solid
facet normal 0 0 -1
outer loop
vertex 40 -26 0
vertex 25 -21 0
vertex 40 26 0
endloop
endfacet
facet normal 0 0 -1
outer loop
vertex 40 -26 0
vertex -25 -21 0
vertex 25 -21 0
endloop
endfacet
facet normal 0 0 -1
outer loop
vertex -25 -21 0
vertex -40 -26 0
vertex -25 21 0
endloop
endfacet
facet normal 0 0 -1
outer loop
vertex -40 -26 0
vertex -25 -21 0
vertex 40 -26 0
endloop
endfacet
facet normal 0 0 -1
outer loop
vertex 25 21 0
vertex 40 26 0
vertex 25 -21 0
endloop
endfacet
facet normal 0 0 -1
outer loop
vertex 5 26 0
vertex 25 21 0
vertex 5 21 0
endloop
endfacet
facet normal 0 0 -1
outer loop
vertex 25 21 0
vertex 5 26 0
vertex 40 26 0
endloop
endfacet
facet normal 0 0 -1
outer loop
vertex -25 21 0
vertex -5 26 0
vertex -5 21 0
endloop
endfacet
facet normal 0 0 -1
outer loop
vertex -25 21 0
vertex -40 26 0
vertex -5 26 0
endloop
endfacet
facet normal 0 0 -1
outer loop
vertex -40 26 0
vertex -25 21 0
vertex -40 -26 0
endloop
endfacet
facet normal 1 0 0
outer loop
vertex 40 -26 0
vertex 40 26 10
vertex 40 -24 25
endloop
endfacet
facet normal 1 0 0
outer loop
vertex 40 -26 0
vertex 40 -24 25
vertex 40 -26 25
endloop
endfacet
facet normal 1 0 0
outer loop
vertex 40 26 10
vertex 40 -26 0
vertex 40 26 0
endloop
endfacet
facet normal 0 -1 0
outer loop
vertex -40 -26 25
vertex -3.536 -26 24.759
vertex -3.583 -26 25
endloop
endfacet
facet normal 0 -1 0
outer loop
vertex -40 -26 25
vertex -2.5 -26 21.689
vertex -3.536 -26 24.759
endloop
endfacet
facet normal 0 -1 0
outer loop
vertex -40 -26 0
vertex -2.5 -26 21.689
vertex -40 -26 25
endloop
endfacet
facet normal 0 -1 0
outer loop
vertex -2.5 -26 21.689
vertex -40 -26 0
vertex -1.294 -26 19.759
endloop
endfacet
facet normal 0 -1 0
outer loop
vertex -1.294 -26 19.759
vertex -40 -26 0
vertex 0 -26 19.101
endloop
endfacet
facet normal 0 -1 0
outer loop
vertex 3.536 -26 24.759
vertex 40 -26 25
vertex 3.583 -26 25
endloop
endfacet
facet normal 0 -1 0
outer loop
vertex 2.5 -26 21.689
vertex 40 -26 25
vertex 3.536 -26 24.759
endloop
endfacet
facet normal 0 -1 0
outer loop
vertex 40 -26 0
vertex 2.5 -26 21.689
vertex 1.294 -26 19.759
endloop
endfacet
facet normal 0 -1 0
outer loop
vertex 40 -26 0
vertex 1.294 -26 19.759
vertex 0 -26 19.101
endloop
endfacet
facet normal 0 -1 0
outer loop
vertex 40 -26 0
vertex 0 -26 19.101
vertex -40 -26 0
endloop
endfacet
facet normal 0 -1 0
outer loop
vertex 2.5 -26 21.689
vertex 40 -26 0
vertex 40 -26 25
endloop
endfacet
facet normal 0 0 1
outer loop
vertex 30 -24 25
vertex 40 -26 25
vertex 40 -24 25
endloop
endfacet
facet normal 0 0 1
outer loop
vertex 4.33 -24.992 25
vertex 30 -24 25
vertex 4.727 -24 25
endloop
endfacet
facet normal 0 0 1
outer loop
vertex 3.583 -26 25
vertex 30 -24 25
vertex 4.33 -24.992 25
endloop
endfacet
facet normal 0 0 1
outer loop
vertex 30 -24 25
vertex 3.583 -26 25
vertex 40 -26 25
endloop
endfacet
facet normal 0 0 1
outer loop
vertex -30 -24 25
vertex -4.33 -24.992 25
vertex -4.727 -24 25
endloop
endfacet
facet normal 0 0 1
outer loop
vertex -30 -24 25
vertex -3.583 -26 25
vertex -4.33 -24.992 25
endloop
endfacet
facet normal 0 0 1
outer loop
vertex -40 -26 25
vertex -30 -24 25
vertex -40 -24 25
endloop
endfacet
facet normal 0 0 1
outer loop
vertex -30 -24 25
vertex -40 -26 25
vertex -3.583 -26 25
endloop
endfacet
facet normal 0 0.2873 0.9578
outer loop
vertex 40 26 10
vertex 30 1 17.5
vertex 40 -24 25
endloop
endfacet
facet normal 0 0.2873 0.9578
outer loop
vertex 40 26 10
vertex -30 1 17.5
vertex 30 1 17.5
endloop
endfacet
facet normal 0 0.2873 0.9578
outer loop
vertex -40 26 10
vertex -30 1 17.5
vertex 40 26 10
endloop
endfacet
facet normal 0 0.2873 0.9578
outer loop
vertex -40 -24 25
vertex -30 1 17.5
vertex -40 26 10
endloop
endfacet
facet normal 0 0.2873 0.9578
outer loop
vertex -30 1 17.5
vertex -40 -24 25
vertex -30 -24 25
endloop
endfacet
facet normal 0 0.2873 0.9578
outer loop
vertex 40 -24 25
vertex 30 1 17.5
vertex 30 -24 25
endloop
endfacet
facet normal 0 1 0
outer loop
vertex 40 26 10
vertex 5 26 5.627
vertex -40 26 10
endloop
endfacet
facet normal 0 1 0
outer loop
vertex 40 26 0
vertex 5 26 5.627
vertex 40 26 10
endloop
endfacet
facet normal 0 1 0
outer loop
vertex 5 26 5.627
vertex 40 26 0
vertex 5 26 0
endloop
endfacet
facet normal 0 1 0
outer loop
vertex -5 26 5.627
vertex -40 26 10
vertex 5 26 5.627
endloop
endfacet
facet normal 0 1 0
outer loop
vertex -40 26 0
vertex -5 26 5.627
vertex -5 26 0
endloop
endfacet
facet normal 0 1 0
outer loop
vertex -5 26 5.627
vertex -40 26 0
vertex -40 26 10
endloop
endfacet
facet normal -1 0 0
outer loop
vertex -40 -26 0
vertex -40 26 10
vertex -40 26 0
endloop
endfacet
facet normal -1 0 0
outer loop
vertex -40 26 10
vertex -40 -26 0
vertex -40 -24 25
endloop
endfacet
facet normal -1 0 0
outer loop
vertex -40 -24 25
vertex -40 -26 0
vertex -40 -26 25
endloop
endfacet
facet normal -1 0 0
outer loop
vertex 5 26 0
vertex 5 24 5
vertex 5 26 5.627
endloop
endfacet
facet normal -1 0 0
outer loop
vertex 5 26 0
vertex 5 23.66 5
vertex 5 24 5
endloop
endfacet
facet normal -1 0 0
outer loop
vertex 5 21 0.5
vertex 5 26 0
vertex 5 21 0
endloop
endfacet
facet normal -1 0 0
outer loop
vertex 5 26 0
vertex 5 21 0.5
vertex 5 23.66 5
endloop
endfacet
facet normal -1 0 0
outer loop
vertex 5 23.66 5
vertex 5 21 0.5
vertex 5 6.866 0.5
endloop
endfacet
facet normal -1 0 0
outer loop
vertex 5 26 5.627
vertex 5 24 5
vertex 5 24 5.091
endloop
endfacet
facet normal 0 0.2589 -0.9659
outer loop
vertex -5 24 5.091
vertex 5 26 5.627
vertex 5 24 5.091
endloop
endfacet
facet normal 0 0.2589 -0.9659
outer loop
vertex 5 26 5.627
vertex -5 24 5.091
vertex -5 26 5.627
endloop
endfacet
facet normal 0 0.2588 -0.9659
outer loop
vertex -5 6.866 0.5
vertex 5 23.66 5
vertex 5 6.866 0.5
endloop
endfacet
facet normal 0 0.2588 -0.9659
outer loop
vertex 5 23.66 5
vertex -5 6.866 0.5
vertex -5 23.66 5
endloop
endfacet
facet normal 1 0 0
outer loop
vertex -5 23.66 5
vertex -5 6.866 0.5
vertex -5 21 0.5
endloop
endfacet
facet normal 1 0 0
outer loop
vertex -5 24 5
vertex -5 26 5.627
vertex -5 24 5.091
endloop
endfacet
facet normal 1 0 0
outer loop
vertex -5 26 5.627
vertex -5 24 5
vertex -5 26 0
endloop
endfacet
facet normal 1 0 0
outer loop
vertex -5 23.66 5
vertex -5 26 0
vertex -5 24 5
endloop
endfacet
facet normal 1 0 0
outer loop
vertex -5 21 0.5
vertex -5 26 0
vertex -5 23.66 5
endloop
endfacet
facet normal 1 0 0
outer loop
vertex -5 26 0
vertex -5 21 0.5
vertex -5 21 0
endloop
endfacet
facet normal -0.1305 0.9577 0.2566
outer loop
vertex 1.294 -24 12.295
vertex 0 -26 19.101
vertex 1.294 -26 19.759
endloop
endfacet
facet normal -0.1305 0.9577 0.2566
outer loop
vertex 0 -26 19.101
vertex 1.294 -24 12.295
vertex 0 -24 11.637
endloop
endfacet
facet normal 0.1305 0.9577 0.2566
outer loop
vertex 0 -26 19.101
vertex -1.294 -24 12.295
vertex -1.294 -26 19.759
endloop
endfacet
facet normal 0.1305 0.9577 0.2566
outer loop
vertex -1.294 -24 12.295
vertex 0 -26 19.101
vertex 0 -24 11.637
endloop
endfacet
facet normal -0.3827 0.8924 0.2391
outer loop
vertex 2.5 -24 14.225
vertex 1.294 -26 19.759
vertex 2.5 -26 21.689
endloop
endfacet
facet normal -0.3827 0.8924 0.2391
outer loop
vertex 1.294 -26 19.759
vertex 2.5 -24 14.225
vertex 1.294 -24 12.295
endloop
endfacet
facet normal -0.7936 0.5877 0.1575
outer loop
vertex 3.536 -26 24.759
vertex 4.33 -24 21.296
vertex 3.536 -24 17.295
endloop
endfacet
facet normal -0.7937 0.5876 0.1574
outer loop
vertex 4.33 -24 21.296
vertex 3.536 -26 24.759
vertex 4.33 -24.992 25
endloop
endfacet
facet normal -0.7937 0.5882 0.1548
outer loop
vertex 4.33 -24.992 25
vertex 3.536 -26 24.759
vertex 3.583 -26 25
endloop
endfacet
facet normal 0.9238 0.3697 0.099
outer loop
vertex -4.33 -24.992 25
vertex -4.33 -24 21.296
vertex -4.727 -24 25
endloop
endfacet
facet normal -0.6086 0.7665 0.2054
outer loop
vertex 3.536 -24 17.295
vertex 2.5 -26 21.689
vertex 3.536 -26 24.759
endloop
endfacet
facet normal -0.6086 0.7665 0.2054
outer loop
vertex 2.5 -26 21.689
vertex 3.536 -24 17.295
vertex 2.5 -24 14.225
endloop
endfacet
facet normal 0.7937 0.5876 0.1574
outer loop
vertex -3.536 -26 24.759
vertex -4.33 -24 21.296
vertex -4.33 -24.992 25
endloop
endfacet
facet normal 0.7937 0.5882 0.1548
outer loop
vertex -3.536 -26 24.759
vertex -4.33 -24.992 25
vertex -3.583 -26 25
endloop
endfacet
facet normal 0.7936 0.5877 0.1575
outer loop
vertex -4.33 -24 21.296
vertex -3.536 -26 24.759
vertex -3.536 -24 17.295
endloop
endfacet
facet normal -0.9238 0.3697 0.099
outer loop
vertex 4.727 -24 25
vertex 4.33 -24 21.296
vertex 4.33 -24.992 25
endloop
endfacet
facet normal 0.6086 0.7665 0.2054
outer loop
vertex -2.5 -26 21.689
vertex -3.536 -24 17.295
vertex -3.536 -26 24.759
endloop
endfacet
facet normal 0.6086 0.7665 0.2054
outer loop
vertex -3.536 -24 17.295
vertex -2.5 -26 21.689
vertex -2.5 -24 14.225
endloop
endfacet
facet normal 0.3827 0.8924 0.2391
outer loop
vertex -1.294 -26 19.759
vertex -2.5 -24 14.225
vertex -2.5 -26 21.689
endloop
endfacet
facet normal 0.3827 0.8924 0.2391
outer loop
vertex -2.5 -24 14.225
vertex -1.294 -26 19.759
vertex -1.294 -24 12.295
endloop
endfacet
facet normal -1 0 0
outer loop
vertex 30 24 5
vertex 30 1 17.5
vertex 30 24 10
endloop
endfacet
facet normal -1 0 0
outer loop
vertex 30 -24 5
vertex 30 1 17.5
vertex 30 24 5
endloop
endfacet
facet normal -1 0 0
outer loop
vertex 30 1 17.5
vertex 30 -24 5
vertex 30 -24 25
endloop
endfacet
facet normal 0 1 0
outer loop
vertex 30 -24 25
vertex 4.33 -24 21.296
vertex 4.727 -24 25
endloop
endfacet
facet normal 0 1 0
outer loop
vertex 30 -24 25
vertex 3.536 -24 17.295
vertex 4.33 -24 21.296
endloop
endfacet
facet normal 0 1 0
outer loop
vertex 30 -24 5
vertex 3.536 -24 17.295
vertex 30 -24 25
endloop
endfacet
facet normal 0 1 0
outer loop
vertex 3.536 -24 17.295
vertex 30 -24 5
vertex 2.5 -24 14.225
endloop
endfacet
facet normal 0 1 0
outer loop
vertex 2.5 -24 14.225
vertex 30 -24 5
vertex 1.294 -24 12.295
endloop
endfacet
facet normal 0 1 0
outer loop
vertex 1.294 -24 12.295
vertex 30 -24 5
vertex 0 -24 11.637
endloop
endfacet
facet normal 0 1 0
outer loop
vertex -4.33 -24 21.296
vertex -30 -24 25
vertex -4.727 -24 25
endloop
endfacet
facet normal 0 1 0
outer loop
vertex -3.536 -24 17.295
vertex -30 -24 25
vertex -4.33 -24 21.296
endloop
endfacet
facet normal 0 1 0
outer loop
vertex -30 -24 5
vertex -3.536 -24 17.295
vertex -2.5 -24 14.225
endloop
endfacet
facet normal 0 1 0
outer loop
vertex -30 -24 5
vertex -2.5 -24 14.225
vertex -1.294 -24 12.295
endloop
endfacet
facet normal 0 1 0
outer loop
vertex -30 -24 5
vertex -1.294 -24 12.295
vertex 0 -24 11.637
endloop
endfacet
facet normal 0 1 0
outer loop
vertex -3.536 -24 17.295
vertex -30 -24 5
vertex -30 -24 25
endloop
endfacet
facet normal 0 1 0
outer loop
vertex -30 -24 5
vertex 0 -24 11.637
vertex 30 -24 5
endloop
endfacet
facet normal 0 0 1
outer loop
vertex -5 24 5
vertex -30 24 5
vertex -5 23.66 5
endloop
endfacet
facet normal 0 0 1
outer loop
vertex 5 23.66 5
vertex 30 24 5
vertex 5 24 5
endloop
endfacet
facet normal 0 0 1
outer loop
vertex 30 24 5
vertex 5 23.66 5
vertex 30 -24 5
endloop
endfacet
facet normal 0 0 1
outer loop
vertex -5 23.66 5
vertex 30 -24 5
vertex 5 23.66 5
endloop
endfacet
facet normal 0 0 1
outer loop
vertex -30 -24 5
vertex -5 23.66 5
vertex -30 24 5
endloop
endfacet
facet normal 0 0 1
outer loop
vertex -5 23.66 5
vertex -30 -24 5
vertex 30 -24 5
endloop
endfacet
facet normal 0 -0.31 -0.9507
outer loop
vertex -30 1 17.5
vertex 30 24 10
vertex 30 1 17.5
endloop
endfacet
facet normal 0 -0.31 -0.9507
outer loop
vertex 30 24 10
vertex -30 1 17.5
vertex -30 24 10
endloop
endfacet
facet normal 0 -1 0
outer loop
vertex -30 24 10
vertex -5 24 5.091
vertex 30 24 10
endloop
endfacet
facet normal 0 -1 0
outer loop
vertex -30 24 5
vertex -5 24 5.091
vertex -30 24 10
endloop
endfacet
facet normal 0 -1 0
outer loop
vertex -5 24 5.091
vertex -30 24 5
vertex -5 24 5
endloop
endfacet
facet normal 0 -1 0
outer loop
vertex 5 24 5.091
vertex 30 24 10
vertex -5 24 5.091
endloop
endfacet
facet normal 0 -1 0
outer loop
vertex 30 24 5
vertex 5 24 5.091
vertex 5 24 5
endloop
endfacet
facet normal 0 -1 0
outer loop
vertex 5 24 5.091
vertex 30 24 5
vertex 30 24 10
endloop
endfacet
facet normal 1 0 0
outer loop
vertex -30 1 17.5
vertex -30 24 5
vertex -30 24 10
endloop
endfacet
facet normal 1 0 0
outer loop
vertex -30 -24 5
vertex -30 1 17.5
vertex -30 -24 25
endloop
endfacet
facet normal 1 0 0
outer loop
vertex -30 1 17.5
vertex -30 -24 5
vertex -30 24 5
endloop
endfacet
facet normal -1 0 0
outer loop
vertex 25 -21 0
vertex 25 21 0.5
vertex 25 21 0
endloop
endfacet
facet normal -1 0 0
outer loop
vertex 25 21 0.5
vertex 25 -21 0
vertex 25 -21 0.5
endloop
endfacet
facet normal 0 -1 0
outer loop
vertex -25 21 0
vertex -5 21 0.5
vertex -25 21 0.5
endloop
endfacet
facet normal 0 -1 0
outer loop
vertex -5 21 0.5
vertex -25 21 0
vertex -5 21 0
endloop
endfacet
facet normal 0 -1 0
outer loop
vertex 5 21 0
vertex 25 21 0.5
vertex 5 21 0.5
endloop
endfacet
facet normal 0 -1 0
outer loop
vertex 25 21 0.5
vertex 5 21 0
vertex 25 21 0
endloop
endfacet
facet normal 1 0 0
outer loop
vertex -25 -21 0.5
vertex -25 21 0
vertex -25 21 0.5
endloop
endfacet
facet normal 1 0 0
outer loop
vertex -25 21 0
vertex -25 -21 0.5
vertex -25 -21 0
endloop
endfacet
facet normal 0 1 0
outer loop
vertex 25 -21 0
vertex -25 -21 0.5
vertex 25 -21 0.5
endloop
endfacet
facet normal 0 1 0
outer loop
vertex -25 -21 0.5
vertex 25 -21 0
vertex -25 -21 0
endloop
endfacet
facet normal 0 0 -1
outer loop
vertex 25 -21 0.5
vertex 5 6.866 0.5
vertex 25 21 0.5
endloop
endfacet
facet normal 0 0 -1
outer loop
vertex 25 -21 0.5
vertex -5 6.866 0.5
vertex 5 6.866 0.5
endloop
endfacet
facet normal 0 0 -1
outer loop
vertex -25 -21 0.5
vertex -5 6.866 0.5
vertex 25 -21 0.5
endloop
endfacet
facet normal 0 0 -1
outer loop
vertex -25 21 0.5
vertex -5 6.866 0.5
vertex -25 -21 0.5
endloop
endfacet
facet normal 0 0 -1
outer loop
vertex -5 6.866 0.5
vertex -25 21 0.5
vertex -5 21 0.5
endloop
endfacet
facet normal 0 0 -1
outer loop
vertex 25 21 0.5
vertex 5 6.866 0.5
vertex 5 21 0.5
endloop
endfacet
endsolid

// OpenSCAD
// ==========================================
// Xentient Framework - Anchor: Desk Pedestal Adapter
// Weighted wedge stand, 15° upward tilt, cable routing
// Per Framework §5
// ==========================================
// Component: Male cylinder (40mm dia) with cross-keys
//            Wedge-shaped base, 15° upward angle
//            Hollow routing channel for USB-C cable
// Material: PETG (structural) + weighted fill (sand/metal in base)
// Units: mm

$fn = 64;

// ==========================================
// ANCHOR DIMENSIONS (matching hub rear)
// ==========================================

Anchor_Dia   = 40.0;    // Male cylinder diameter
Anchor_Depth = 6.0;     // Insertion depth
Anchor_Key_W = 10.0;    // Anti-rotation key width

// Desk pedestal dimensions
Tilt_Angle   = 15;      // 15° upward angle for optimal viewing
Base_W       = 80.0;    // Base width (stable footprint)
Base_D       = 70.0;    // Base depth (front to back)
Base_H       = 25.0;    // Base height at rear (highest point)
Base_Min_H   = 10.0;    // Base height at front (lowest point)
Wall_T       = 2.5;     // Wall thickness

// Cable routing
Cable_D      = 8.0;     // USB-C cable diameter for routing channel

// Weight fill pocket (for sand/metal insert)
Weight_W     = 60.0;
Weight_D     = 50.0;
Weight_H     = 10.0;

// ==========================================
// MODULE: anchor_desk_pedestal()
// ==========================================

module anchor_desk_pedestal() {
    difference() {
        union() {
            // Male cylinder (plugs into hub rear)
            cylinder(h=Anchor_Depth, d=Anchor_Dia, $fn=64);

            // Anti-rotation cross-keys
            for (a = [0, 90]) {
                rotate([0, 0, a])
                    translate([0, -Anchor_Key_W/2, 0])
                        cube([Anchor_Dia/2 + 2, Anchor_Key_W, Anchor_Depth]);
            }

            // Wedge base (15° tilt)
            // Front is low, rear is high for upward viewing angle
            hull() {
                // Front face (low)
                translate([0, Base_D/2 - 10, Base_Min_H/2])
                    cube([Base_W, 2, Base_Min_H], center=true);
                // Rear face (high)
                translate([0, -Base_D/2 + 10, Base_H/2])
                    cube([Base_W, 2, Base_H], center=true);
            }

            // Draft taper on cylinder
            translate([0, 0, Anchor_Depth - 0.5])
                cylinder(h=1, d1=Anchor_Dia, d2=Anchor_Dia + 1.0, $fn=64);
        }

        // Hollow interior for weight fill
        translate([0, 0, Wall_T])
            hull() {
                translate([0, Base_D/2 - 12, Base_Min_H/2])
                    cube([Weight_W, 2, Base_Min_H - 2*Wall_T], center=true);
                translate([0, -Base_D/2 + 12, Base_H/2])
                    cube([Weight_W, 2, Base_H - 2*Wall_T], center=true);
            }

        // Weight fill access (bottom opening)
        translate([0, 0, -1])
            hull() {
                translate([0, Base_D/2 - 15, 0])
                    cube([Weight_W - 10, 2, 3], center=true);
                translate([0, -Base_D/2 + 15, 0])
                    cube([Weight_W - 10, 2, 3], center=true);
            }

        // Cable routing channel (from rear, through base, to anchor cylinder)
        // Channel follows the 15° tilt
        translate([0, 5, 0])
            rotate([Tilt_Angle, 0, 0]) {
                // Horizontal section under base
                translate([0, 0, -Base_Min_H/2])
                    cube([Cable_D + 2, Base_D + 10, Cable_D + 2], center=true);
                // Vertical section up to anchor
                translate([0, -Base_D/2 + 15, Base_H/2])
                    cylinder(h=Anchor_Depth + Base_H, d=Cable_D + 2, $fn=24);
            }

        // Anti-rotation keyway cutouts (matching hub grooves)
        // 1° draft on cylinder for wedge fit
    }
}

// ==========================================
// RENDER
// ==========================================

anchor_desk_pedestal();
